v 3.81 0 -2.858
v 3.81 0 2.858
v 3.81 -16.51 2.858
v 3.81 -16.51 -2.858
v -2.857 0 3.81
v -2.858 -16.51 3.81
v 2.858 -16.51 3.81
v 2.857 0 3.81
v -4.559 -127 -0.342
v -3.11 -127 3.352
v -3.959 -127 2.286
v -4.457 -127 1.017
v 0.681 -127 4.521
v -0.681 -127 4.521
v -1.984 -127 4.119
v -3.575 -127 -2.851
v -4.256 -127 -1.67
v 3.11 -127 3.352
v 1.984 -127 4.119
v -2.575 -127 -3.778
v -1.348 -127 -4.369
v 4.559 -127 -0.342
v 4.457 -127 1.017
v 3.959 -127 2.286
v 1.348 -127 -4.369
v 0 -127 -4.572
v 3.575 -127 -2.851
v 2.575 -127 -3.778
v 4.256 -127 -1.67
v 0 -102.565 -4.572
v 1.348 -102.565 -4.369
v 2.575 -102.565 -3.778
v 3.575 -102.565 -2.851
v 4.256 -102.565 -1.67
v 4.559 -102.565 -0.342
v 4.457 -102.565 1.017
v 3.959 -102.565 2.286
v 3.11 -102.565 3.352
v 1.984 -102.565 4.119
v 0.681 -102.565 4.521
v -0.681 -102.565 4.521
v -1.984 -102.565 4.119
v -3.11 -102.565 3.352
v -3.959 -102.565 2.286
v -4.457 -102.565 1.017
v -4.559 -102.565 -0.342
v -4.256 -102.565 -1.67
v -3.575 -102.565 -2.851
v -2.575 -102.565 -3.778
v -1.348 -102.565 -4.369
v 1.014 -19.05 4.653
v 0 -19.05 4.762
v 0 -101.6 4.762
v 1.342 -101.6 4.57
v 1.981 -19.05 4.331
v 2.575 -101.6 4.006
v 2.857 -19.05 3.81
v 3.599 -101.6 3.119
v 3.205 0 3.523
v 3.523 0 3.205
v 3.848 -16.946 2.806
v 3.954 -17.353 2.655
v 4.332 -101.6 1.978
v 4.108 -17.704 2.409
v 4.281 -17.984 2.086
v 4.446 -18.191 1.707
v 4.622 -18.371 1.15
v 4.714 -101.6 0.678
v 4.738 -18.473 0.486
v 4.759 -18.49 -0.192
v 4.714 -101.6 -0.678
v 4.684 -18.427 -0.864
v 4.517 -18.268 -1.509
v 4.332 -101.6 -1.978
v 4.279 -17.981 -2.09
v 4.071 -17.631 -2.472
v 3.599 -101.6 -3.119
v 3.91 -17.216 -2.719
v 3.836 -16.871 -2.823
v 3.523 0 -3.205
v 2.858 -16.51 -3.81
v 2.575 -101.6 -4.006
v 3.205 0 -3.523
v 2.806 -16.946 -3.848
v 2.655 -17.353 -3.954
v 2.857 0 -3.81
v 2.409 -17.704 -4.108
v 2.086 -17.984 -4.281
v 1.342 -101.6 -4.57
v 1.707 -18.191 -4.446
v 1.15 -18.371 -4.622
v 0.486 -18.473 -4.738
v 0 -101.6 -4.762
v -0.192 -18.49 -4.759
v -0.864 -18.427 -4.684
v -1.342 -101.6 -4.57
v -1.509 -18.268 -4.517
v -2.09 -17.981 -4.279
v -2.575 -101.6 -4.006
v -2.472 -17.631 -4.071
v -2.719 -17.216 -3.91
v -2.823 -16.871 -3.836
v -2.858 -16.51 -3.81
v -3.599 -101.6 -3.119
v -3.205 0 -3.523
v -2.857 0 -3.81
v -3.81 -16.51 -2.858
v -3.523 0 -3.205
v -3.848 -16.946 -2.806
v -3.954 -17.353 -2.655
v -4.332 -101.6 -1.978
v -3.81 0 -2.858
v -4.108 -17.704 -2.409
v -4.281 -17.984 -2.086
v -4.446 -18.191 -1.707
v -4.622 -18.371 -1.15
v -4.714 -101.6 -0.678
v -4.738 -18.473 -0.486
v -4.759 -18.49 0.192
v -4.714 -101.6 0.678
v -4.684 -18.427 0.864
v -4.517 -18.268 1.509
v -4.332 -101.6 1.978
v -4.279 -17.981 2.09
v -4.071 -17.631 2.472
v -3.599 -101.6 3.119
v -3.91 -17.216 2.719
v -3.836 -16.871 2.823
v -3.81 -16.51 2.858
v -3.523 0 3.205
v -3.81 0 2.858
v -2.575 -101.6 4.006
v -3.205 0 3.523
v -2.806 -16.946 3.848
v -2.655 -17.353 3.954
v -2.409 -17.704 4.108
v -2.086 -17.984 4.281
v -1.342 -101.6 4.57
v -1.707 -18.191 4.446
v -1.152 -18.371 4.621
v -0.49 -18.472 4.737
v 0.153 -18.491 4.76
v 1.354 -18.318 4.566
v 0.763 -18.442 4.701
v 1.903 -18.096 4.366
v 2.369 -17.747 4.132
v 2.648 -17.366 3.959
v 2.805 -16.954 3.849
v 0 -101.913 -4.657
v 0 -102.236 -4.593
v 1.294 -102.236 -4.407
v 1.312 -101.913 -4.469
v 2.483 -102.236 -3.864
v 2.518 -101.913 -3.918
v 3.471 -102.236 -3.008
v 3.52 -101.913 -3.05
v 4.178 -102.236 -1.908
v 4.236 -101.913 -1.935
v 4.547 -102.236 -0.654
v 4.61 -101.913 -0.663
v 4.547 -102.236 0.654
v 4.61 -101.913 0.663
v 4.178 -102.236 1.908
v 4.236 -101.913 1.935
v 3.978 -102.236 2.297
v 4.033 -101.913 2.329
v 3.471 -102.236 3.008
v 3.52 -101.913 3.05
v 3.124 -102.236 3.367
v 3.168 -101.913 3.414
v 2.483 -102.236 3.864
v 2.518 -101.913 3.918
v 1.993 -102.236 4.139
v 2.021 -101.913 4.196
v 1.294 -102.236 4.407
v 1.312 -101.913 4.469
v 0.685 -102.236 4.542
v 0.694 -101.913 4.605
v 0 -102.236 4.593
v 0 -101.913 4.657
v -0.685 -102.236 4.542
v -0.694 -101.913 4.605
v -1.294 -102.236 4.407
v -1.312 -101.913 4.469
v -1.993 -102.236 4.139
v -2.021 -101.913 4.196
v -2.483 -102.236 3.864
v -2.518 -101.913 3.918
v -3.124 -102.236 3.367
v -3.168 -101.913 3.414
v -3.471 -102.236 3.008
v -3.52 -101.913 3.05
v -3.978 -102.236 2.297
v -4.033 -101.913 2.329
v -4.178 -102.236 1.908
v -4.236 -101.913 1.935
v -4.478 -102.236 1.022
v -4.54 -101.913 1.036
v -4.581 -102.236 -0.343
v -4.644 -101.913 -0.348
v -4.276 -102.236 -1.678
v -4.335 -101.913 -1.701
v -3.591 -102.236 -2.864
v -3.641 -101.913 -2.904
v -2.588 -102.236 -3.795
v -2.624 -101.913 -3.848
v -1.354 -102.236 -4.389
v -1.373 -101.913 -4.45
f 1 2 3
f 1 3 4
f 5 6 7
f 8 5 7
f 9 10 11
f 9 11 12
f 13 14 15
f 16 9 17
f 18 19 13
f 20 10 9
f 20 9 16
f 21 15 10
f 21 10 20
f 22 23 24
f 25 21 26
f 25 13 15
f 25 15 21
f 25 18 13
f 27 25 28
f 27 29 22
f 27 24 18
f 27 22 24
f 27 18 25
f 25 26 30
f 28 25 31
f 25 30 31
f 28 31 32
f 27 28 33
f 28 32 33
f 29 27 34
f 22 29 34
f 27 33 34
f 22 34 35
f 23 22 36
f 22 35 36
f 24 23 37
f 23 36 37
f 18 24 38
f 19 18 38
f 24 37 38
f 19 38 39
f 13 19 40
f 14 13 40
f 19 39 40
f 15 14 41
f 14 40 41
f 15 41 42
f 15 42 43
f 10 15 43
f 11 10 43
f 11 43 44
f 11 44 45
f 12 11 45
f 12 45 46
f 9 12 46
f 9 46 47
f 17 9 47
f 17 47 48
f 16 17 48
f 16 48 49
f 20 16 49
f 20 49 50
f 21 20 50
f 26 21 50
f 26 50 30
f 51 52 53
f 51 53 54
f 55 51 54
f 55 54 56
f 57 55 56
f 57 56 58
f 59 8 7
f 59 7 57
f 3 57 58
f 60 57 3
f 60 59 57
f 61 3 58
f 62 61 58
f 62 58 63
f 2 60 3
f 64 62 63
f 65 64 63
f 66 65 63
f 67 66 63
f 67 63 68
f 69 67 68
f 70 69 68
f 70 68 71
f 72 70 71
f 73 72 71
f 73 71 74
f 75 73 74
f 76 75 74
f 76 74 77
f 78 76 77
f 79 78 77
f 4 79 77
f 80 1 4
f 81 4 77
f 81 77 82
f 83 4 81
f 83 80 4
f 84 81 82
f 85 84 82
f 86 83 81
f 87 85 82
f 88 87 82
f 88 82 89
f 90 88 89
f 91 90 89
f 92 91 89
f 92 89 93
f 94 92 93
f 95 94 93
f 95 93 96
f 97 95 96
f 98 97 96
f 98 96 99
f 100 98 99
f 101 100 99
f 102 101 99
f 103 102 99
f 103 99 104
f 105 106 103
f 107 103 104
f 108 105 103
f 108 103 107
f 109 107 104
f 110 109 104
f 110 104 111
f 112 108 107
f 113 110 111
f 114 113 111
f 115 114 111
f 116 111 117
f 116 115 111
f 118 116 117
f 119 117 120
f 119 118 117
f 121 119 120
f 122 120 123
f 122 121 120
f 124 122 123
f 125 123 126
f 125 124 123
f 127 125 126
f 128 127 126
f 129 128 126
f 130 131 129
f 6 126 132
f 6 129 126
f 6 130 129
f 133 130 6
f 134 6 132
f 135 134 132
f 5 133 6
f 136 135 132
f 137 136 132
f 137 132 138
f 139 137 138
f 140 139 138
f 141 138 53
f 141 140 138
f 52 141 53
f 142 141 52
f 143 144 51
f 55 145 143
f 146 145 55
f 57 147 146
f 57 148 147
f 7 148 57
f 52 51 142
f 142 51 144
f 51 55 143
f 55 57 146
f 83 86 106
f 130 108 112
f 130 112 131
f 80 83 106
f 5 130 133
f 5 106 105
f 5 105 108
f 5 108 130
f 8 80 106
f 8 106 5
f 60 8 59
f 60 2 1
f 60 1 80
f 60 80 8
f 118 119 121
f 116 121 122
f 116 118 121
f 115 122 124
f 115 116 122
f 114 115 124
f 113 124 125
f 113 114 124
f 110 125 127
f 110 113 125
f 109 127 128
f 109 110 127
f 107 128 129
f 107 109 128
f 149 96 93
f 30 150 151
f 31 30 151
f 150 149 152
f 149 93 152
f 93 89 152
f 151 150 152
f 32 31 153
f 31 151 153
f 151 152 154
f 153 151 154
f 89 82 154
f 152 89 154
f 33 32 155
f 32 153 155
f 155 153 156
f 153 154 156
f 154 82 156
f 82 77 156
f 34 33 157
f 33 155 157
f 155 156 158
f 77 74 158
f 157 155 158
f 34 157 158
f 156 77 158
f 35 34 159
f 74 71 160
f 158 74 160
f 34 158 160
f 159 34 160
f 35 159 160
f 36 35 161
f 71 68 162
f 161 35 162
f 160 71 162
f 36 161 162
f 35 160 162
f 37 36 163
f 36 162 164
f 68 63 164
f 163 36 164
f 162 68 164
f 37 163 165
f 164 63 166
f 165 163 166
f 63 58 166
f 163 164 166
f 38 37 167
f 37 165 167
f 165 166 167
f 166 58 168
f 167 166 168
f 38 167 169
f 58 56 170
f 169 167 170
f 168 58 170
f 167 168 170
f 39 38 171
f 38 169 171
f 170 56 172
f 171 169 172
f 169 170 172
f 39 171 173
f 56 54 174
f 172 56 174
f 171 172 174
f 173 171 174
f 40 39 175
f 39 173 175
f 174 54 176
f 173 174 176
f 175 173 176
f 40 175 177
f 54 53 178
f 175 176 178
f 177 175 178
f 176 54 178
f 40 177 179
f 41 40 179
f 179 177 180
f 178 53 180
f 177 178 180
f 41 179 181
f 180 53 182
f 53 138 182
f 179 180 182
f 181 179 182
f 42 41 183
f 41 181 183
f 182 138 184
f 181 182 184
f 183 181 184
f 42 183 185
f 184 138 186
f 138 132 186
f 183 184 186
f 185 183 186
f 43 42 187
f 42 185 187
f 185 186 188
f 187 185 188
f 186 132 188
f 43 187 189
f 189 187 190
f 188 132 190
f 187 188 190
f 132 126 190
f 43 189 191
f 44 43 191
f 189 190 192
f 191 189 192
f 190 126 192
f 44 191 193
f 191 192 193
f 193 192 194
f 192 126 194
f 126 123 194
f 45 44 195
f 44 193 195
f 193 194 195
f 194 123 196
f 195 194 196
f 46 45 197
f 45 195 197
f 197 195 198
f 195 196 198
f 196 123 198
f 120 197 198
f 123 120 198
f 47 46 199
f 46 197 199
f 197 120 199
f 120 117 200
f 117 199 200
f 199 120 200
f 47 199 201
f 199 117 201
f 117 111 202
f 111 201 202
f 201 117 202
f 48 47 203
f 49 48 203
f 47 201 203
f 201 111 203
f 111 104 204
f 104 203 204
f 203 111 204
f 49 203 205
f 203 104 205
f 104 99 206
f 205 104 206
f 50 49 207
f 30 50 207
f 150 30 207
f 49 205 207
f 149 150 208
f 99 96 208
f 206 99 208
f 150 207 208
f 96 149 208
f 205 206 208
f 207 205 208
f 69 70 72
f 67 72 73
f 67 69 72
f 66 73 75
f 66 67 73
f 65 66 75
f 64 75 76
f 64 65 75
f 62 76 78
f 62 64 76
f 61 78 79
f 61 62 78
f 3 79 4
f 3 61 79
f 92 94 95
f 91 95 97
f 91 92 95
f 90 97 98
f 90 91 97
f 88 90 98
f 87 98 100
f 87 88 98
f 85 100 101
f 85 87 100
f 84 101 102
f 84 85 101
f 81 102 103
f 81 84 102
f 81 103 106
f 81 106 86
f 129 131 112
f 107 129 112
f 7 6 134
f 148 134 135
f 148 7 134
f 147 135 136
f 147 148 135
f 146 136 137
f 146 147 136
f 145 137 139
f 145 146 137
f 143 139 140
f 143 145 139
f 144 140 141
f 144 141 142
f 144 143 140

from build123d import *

# Parameters (mm, degrees)
SKETCH1_R           = 4.7625
BOSS_EXTRUDE1_DEPTH = 101.6
SKETCH2_W           = 11.315378495
SKETCH2_H           = 2.135355531
CUT_EXTRUDE1_DEPTH  = 19.05
SKETCH3_W           = 2.441021898
SKETCH3_H           = 8.016208274
CUT_EXTRUDE2_DEPTH  = 19.05
FILLET1_R           = 2.54
SKETCH4_R           = 4.572
BOSS_EXTRUDE2_DEPTH = 25.4
FILLET2_R           = 2.54


with BuildPart() as part:
    # Sketch1 → Boss-Extrude1 (new body)
    with BuildSketch(Plane(origin=(0, 0, 0), x_dir=(1, 0, 0), z_dir=(0, 1, 0))):
        with Locations(Location((0, 0, 0), (0, 0, 270))):
            Circle(SKETCH1_R)
    extrude(amount=-BOSS_EXTRUDE1_DEPTH)

    # Sketch2 → Cut-Extrude1 (cut)
    with BuildSketch(Plane(origin=(0, 0, 0), x_dir=(1, 0, 0), z_dir=(0, 1, 0))):
        with Locations((0.38675801, 4.877677766)):
            Rectangle(SKETCH2_W, SKETCH2_H)
        with Locations((-0.38675801, -4.877677766)):
            Rectangle(SKETCH2_W, SKETCH2_H)
    extrude(amount=-CUT_EXTRUDE1_DEPTH, mode=Mode.SUBTRACT)

    # Sketch3 → Cut-Extrude2 (cut)
    with BuildSketch(Plane(origin=(0, 0, 0), x_dir=(1, 0, 0), z_dir=(0, 1, 0))):
        with Locations((5.030510949, -0.198104137)):
            Rectangle(SKETCH3_W, SKETCH3_H)
        with Locations((-5.030510949, 0.198104137)):
            Rectangle(SKETCH3_W, SKETCH3_H)
    extrude(amount=-CUT_EXTRUDE2_DEPTH, mode=Mode.SUBTRACT)

    # Fillet1
    # the kernel refuses this fillet: 2.54 mm, written as the material it adds along each edge
    with BuildSketch(Plane(origin=(9.2075, -19.05, -3.81), x_dir=(0, 1, 0), z_dir=(-1, 0, 0))) as fillet1_piece_1_section:
        with BuildLine():
            CenterArc((FILLET1_R, FILLET1_R), FILLET1_R, 180, 90)
            Line((0, FILLET1_R), (0, 0))
            Line((0, 0), (FILLET1_R, 0))
        make_face()
    fillet1_piece_1 = extrude(amount=18.415, mode=Mode.PRIVATE)
    fillet1_piece_1 = fillet1_piece_1 & Plane(origin=(0, -18.276812149, 0), x_dir=(0, 0, 1), z_dir=(0, 1, 0)) * Cylinder(4.7625, 47, mode=Mode.PRIVATE)
    add(fillet1_piece_1)
    with BuildSketch(Plane(origin=(3.81, -19.05, 9.2075), x_dir=(0, 1, 0), z_dir=(0, 0, -1))) as fillet1_piece_2_section:
        with BuildLine():
            CenterArc((FILLET1_R, FILLET1_R), FILLET1_R, 180, 90)
            Line((0, FILLET1_R), (0, 0))
            Line((0, 0), (FILLET1_R, 0))
        make_face()
    fillet1_piece_2 = extrude(amount=18.415, mode=Mode.PRIVATE)
    fillet1_piece_2 = fillet1_piece_2 & Plane(origin=(0, -18.276812149, 0), x_dir=(0, 0, 1), z_dir=(0, 1, 0)) * Cylinder(4.7625, 47, mode=Mode.PRIVATE)
    add(fillet1_piece_2)
    with BuildSketch(Plane(origin=(-3.81, -19.05, -9.2075), x_dir=(0, 1, 0), z_dir=(0, 0, 1))) as fillet1_piece_3_section:
        with BuildLine():
            CenterArc((FILLET1_R, FILLET1_R), FILLET1_R, 180, 90)
            Line((0, FILLET1_R), (0, 0))
            Line((0, 0), (FILLET1_R, 0))
        make_face()
    fillet1_piece_3 = extrude(amount=18.415, mode=Mode.PRIVATE)
    fillet1_piece_3 = fillet1_piece_3 & Plane(origin=(0, -18.276812149, 0), x_dir=(0, 0, 1), z_dir=(0, 1, 0)) * Cylinder(4.7625, 47, mode=Mode.PRIVATE)
    add(fillet1_piece_3)
    with BuildSketch(Plane(origin=(9.2075, -19.05, 3.81), x_dir=(0, 0, 1), z_dir=(-1, 0, 0))) as fillet1_piece_4_section:
        with BuildLine():
            CenterArc((FILLET1_R, FILLET1_R), FILLET1_R, 180, 90)
            Line((0, FILLET1_R), (0, 0))
            Line((0, 0), (FILLET1_R, 0))
        make_face()
    fillet1_piece_4 = extrude(amount=18.415, mode=Mode.PRIVATE)
    fillet1_piece_4 = fillet1_piece_4 & Plane(origin=(0, -18.276814904, 0), x_dir=(0, 0, 1), z_dir=(0, 1, 0)) * Cylinder(4.7625, 47, mode=Mode.PRIVATE)
    add(fillet1_piece_4)

    # Sketch4 → Boss-Extrude2 (add)
    with BuildSketch(Plane.XZ.offset(101.6)):
        with Locations(Location((0, 0, 0), (0, 0, 270))):
            Circle(SKETCH4_R)
    extrude(amount=BOSS_EXTRUDE2_DEPTH)

    # Fillet2
    # the kernel refuses this fillet: 2.54 mm, written as the material it adds along each edge
    with BuildSketch(Plane(origin=(0, -101.6, 0), x_dir=(0, 0, -1), z_dir=(-1, 0, 0))) as fillet2_piece_1:
        with BuildLine():
            CenterArc((7.112, 0.965116444), FILLET2_R, 180, 22.331645009)
            Line((4.572, 0.965116444), (4.5212, 0.965116444))
            Line((4.5212, 0.965116444), (4.5212, 0))
            Line((4.5212, 0), (4.572, -0.0508))
            ThreePointArc((4.572, -0.0508), (4.66725, -0.0508), (4.71551, -0.019302329))
            Line((4.71551, -0.019302329), (4.7625, 0))
        make_face()
    revolve(axis=Axis((0, -101.6, 0), (0, -1, 0)))


solid = part.part
